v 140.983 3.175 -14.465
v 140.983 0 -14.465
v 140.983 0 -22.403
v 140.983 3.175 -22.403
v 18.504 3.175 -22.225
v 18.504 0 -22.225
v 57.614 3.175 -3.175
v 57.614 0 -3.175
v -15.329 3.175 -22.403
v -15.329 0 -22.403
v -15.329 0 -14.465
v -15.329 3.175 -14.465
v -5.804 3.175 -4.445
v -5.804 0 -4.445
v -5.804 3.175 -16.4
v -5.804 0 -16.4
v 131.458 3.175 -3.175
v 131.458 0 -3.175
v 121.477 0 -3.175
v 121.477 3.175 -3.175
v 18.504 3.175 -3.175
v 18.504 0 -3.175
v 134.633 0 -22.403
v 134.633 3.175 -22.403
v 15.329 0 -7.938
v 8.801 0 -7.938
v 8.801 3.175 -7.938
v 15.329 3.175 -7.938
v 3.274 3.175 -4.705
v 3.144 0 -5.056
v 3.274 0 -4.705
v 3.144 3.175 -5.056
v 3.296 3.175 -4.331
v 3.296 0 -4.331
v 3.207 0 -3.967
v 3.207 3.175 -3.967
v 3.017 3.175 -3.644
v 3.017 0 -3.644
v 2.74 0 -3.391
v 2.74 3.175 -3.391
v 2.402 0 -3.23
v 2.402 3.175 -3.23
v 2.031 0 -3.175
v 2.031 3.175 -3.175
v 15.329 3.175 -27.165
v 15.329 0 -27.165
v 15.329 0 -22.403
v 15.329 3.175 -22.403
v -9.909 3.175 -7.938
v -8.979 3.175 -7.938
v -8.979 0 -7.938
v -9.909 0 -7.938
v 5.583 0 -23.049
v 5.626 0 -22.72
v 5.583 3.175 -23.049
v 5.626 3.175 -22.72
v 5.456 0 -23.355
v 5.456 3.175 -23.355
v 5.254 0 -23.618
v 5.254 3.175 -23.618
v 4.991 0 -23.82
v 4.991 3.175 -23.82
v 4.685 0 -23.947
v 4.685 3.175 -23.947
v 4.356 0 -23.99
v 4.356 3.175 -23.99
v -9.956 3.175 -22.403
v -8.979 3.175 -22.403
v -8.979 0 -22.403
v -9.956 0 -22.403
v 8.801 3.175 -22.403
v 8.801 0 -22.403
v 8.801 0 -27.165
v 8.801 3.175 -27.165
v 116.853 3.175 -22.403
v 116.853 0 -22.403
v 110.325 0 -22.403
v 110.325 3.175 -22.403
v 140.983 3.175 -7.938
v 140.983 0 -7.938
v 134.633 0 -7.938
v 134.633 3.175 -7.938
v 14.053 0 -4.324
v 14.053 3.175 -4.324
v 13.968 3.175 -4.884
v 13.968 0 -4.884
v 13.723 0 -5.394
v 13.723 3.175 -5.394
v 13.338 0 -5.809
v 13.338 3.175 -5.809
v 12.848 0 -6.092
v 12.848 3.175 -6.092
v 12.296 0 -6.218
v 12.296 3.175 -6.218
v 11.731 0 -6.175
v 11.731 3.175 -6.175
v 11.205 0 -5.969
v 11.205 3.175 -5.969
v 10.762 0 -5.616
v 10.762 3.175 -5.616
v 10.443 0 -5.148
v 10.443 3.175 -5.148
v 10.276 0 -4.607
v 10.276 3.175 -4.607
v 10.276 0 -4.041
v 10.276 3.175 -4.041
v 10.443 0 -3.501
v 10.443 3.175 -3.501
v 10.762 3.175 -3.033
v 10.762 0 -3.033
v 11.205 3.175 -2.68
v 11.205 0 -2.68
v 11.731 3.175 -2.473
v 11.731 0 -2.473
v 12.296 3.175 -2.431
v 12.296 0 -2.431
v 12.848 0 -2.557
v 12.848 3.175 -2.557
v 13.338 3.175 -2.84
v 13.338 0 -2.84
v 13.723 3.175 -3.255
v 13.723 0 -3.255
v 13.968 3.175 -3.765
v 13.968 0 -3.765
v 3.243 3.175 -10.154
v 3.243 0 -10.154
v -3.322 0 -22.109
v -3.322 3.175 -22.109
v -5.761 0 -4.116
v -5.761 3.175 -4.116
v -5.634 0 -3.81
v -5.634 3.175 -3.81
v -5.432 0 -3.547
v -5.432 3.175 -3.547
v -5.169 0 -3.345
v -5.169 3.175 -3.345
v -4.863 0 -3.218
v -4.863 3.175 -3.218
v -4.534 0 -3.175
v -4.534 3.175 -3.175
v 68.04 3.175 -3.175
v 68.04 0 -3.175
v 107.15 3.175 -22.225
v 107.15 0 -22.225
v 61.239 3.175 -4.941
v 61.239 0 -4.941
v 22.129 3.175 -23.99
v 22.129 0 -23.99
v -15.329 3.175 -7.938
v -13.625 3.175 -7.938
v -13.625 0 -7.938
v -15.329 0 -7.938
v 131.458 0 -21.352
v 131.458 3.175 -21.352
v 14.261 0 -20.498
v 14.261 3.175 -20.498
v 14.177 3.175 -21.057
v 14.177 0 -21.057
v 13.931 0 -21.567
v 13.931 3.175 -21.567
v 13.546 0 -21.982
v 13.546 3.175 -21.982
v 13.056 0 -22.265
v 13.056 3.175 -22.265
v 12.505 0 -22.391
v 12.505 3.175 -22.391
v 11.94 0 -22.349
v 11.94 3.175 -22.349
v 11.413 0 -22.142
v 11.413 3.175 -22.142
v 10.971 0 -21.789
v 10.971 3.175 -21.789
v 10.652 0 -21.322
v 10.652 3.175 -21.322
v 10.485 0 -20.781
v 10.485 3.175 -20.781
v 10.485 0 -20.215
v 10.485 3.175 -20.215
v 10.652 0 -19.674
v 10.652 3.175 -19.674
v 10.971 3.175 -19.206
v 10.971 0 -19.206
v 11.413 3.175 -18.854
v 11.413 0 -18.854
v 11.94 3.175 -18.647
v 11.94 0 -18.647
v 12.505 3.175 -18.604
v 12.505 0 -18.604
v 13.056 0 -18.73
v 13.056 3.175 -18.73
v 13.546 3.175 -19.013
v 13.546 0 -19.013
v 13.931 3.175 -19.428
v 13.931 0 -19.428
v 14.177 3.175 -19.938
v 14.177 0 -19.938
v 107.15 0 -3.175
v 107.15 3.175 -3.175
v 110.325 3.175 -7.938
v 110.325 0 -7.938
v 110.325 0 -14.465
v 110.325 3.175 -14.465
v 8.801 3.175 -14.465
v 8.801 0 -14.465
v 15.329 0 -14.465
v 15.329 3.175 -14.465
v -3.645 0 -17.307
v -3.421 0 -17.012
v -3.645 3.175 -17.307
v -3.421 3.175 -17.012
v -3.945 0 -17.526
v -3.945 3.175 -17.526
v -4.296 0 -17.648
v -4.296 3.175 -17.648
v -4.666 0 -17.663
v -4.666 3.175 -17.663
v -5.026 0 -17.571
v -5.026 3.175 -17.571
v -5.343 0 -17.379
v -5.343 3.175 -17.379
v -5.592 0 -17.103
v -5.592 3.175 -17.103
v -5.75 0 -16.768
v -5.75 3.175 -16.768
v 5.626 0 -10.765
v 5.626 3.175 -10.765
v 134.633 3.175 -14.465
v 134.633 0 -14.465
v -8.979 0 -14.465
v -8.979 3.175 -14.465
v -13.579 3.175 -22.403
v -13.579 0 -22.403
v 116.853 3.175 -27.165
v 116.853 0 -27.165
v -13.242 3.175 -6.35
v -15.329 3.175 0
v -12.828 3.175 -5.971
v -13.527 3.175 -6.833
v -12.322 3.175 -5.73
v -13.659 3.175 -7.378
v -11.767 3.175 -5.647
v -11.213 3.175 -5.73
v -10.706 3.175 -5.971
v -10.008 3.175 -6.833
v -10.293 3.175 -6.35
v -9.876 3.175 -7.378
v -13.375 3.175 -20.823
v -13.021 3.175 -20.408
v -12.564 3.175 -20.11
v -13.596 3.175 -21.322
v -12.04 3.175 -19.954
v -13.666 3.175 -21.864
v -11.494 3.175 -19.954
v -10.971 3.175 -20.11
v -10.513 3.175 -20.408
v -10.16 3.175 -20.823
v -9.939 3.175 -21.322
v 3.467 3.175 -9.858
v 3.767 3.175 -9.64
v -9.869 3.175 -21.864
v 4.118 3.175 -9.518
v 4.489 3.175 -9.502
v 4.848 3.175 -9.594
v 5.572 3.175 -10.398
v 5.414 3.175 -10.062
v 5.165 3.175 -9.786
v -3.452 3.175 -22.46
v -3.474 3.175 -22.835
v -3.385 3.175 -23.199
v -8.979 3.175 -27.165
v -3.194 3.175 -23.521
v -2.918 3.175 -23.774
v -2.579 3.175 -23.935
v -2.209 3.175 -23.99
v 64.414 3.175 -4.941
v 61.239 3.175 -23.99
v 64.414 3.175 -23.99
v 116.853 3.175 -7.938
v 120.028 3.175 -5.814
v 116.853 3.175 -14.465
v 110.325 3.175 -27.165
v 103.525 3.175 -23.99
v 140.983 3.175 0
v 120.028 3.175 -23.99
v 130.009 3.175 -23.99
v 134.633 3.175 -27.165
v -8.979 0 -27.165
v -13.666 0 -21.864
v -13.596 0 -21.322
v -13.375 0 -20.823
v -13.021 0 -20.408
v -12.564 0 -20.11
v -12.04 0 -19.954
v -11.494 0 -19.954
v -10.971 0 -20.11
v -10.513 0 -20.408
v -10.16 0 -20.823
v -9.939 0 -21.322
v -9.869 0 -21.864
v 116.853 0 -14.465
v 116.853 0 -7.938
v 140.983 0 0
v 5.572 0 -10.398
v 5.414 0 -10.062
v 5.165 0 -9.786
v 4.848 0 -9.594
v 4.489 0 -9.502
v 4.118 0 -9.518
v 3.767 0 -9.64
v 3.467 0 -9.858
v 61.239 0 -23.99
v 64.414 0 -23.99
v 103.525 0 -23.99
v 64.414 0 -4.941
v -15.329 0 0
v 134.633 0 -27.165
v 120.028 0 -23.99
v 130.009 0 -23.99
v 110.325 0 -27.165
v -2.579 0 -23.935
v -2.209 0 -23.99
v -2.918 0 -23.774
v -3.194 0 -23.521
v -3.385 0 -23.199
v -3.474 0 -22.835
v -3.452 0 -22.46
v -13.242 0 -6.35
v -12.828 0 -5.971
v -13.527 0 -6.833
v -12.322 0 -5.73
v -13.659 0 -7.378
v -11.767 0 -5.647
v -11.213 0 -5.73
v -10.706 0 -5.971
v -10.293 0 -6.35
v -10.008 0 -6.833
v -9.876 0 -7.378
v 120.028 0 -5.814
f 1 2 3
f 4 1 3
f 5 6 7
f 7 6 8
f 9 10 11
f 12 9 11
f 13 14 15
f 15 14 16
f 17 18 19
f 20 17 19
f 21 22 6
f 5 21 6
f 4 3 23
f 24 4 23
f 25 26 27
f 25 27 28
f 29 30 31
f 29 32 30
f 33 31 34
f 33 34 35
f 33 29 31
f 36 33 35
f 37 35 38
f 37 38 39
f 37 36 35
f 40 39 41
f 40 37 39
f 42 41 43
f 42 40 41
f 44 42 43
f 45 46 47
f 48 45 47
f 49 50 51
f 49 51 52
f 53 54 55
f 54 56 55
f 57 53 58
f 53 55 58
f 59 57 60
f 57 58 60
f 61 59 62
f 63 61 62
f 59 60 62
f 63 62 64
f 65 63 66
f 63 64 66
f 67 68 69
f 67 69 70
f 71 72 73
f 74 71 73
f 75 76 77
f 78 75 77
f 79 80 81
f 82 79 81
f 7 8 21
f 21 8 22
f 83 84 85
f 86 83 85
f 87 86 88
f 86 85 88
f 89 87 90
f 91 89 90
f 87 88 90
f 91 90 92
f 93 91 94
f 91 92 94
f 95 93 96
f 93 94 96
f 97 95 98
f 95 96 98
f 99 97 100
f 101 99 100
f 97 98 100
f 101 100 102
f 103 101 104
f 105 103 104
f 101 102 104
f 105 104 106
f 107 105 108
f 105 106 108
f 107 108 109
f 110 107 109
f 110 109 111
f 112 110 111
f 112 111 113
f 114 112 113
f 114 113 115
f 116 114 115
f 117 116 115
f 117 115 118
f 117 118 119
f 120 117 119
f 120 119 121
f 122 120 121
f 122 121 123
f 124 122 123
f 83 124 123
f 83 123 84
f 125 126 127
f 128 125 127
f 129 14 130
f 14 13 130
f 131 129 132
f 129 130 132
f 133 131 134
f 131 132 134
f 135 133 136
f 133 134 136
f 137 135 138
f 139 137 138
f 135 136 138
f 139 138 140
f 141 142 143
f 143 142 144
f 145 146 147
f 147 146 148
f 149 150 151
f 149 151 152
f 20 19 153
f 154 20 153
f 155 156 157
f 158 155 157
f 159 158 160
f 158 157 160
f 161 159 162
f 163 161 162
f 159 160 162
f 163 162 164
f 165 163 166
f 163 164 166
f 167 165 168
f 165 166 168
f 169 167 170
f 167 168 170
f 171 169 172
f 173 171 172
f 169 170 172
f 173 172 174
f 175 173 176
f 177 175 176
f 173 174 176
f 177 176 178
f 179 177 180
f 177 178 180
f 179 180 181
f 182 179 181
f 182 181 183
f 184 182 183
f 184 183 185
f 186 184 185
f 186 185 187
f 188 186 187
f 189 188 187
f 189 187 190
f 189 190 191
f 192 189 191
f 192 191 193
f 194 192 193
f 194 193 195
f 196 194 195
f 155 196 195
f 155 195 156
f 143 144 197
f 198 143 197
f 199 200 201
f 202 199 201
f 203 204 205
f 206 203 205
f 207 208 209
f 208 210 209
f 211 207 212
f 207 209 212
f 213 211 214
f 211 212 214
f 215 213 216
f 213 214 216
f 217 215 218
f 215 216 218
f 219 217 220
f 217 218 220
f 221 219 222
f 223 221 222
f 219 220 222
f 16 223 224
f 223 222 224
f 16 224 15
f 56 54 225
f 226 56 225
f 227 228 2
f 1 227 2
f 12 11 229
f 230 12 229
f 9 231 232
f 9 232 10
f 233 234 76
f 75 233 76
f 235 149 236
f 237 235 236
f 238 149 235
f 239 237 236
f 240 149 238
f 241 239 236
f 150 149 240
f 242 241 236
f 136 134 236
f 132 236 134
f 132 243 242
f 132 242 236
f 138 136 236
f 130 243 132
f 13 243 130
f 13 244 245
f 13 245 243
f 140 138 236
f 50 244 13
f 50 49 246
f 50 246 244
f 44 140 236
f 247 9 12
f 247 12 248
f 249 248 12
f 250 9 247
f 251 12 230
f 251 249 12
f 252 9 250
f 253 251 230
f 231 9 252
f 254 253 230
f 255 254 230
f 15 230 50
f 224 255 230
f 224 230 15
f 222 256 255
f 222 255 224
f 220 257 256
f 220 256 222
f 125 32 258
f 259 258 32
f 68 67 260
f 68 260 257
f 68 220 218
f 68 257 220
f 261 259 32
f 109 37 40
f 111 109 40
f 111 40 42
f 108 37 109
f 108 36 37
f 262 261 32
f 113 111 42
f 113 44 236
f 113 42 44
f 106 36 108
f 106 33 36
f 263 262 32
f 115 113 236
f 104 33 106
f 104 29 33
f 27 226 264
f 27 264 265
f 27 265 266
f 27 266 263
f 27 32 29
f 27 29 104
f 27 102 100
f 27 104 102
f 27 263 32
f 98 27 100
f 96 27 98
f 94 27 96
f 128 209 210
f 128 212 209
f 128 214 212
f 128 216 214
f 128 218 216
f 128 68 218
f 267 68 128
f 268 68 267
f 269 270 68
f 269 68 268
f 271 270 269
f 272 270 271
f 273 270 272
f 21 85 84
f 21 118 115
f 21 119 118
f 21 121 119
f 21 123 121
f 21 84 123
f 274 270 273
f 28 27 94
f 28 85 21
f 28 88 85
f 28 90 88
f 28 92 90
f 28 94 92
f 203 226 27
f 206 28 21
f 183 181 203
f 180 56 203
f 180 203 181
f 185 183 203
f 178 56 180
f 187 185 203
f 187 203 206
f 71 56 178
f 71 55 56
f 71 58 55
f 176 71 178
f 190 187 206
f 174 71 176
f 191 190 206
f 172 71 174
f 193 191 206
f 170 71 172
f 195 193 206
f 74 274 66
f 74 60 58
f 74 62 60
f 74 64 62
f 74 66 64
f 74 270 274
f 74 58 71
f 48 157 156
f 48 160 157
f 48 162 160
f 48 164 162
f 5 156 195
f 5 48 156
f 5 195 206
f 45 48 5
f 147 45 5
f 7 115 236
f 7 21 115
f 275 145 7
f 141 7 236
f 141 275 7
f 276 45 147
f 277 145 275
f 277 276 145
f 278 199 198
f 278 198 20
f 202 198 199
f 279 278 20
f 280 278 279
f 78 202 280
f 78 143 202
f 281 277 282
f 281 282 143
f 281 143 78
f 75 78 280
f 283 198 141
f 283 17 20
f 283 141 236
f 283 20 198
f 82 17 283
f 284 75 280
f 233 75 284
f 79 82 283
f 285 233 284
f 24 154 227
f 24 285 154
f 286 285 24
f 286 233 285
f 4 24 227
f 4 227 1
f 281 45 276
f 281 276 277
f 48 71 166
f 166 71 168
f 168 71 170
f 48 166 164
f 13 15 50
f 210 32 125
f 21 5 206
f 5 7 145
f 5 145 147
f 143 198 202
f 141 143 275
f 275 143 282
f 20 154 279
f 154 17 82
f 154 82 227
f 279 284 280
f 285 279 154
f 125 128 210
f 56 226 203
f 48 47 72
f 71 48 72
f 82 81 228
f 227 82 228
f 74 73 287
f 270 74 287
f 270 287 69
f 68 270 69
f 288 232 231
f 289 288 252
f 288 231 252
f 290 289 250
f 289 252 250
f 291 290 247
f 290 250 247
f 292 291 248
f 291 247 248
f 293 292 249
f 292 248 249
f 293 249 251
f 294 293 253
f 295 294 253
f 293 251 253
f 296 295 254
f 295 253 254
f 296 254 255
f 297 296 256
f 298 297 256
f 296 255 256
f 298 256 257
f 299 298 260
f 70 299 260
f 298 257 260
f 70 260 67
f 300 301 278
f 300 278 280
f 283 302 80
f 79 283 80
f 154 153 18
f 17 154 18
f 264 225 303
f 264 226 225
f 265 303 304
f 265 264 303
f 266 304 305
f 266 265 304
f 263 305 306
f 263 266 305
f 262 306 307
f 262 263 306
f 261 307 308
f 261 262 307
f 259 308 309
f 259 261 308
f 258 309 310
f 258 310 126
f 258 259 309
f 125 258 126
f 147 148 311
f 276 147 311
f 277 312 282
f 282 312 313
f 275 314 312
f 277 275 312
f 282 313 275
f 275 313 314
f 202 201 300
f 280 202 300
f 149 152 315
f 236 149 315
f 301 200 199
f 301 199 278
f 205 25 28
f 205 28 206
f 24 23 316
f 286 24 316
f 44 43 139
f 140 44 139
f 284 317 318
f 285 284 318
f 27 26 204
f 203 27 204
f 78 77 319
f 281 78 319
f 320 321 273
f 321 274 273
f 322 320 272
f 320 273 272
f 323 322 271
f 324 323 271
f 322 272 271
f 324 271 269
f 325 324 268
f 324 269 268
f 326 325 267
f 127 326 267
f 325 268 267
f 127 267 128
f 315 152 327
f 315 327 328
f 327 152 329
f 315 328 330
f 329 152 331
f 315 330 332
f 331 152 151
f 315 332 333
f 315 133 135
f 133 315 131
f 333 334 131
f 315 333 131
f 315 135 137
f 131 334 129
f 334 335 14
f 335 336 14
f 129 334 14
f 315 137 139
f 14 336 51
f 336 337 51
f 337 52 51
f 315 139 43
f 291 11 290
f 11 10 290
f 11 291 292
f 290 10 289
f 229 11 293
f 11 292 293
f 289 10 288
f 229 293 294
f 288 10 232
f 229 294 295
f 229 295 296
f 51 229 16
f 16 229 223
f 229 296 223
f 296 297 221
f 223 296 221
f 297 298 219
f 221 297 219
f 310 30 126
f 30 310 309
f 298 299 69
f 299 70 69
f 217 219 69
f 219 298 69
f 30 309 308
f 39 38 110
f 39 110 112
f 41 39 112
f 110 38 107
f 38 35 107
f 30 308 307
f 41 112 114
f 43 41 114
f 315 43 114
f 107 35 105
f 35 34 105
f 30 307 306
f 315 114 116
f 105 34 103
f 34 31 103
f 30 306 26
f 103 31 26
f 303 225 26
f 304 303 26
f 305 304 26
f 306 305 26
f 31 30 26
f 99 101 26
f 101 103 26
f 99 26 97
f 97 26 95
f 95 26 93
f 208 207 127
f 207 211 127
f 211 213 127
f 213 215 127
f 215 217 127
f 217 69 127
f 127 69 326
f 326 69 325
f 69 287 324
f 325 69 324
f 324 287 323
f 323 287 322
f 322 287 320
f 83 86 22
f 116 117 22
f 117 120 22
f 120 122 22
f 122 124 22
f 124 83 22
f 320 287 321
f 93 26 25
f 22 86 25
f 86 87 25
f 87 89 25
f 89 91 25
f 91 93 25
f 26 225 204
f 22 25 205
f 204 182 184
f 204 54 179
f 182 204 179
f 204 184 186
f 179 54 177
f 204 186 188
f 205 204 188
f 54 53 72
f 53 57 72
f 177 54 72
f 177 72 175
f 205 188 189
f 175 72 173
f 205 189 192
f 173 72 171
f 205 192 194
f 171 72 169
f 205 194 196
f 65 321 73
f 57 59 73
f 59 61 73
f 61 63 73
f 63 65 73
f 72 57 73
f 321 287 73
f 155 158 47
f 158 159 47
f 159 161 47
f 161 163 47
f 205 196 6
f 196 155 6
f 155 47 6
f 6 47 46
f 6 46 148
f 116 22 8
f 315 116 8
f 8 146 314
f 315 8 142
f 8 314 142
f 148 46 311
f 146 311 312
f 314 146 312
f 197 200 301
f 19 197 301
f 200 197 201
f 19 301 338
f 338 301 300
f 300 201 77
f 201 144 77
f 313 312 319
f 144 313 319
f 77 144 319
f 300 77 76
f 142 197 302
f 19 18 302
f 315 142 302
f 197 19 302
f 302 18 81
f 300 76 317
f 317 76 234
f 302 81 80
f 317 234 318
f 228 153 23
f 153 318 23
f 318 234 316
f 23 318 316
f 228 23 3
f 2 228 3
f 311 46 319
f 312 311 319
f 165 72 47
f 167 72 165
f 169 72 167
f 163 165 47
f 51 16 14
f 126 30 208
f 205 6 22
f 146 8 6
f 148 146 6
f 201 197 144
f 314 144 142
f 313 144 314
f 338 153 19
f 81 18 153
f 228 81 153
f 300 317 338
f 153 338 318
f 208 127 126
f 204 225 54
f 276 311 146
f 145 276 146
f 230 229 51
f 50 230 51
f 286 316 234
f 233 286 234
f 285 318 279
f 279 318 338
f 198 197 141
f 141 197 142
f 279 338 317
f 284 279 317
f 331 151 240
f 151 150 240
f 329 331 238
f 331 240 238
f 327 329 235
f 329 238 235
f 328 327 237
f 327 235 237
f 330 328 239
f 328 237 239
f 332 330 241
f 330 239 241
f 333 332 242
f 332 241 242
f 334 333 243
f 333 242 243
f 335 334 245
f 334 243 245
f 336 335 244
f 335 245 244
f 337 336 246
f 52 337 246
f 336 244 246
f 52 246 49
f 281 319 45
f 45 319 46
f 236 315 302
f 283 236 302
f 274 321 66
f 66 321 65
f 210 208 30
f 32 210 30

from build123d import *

# Parameters (mm, degrees)
SKETCH1_W                 = 6.5278
SKETCH1_H                 = 6.5278
BOSS_EXTRUDE1_DEPTH       = 3.175
F_6_CLEARANCE_HOLE1_D     = 3.7973
F_6_CLEARANCE_HOLE1_DEPTH = 6.35
F_6_CLEARANCE_HOLE1_TIP   = 1.140824014
FILLET1_R                 = 1.27


with BuildPart() as part:
    # Sketch1 → Boss-Extrude1 (new body)
    with BuildSketch(Plane(origin=(0, 0, 0), x_dir=(1, 0, 0), z_dir=(0, 1, 0))):
        Polygon((110.3249, 27.1653), (15.3289, 27.1653), (15.3289, 22.4028), (8.8011, 22.4028), (8.8011, 27.1653), (-8.9789, 27.1653), (-8.9789, 22.4028), (-15.3289, 22.4028), (-15.3289, 14.4653), (-8.9789, 14.4653), (-8.9789, 7.9375), (-15.3289, 7.9375), (-15.3289, 0), (140.9827, 0), (140.9827, 7.9375), (134.6327, 7.9375), (134.6327, 14.4653), (140.9827, 14.4653), (140.9827, 22.4028), (134.6327, 22.4028), (134.6327, 27.1653), (116.8527, 27.1653), (116.8527, 22.4028), (110.3249, 22.4028), align=None)
        Polygon((-5.8039, 3.175), (-5.8039, 21.351740689), (4.177226675, 3.175), align=None, mode=Mode.SUBTRACT)
        with Locations((12.065, 11.2014)):
            Rectangle(SKETCH1_W, SKETCH1_H, mode=Mode.SUBTRACT)
        Polygon((18.5039, 3.175), (18.5039, 22.224503319), (57.614076125, 3.175), align=None, mode=Mode.SUBTRACT)
        Polygon((107.1499, 3.175), (68.039723875, 3.175), (107.1499, 22.224503319), align=None, mode=Mode.SUBTRACT)
        with Locations((113.5888, 11.2014)):
            Rectangle(SKETCH1_W, SKETCH1_H, mode=Mode.SUBTRACT)
        Polygon((-4.355026675, 23.9903), (5.6261, 23.9903), (5.6261, 5.813559311), align=None, mode=Mode.SUBTRACT)
        Polygon((22.129223875, 23.9903), (61.2394, 23.9903), (61.2394, 4.940796681), align=None, mode=Mode.SUBTRACT)
        Polygon((64.4144, 4.940796681), (64.4144, 23.9903), (103.524576125, 23.9903), align=None, mode=Mode.SUBTRACT)
        Polygon((120.0277, 23.9903), (130.008826675, 23.9903), (120.0277, 5.813559311), align=None, mode=Mode.SUBTRACT)
        Polygon((131.4577, 21.351740689), (131.4577, 3.175), (121.476573325, 3.175), align=None, mode=Mode.SUBTRACT)
    extrude(amount=BOSS_EXTRUDE1_DEPTH)

    # #6 Clearance Hole1
    with Locations(Plane(origin=(11.855385862, 0, -6.482820987), x_dir=(-1, 0, 0), z_dir=(0, -1, 0))):
        with Locations((-0.507300427, 14.014979013), (-0.298514138, -2.158470987), (23.622699573, 1.063018674), (23.622699573, 15.350518674)):
            Hole(F_6_CLEARANCE_HOLE1_D / 2, depth=F_6_CLEARANCE_HOLE1_DEPTH)
            with Locations((0, 0, -(F_6_CLEARANCE_HOLE1_DEPTH + F_6_CLEARANCE_HOLE1_TIP / 2))):  # 118° drill point
                Cone(0, F_6_CLEARANCE_HOLE1_D / 2, F_6_CLEARANCE_HOLE1_TIP, mode=Mode.SUBTRACT)

    # Fillet1
    fillet1_edges = [part.edges().sort_by_distance(p)[0] for p in [
        (-5.8039, 1.5875, -21.351740689),
        (-5.8039, 1.5875, -3.175),
        (4.177226675, 1.5875, -3.175),
        (5.6261, 1.5875, -5.813559311),
        (5.6261, 1.5875, -23.9903),
        (-4.355026675, 1.5875, -23.9903),
    ]]
    fillet(fillet1_edges, radius=FILLET1_R)


solid = part.part
